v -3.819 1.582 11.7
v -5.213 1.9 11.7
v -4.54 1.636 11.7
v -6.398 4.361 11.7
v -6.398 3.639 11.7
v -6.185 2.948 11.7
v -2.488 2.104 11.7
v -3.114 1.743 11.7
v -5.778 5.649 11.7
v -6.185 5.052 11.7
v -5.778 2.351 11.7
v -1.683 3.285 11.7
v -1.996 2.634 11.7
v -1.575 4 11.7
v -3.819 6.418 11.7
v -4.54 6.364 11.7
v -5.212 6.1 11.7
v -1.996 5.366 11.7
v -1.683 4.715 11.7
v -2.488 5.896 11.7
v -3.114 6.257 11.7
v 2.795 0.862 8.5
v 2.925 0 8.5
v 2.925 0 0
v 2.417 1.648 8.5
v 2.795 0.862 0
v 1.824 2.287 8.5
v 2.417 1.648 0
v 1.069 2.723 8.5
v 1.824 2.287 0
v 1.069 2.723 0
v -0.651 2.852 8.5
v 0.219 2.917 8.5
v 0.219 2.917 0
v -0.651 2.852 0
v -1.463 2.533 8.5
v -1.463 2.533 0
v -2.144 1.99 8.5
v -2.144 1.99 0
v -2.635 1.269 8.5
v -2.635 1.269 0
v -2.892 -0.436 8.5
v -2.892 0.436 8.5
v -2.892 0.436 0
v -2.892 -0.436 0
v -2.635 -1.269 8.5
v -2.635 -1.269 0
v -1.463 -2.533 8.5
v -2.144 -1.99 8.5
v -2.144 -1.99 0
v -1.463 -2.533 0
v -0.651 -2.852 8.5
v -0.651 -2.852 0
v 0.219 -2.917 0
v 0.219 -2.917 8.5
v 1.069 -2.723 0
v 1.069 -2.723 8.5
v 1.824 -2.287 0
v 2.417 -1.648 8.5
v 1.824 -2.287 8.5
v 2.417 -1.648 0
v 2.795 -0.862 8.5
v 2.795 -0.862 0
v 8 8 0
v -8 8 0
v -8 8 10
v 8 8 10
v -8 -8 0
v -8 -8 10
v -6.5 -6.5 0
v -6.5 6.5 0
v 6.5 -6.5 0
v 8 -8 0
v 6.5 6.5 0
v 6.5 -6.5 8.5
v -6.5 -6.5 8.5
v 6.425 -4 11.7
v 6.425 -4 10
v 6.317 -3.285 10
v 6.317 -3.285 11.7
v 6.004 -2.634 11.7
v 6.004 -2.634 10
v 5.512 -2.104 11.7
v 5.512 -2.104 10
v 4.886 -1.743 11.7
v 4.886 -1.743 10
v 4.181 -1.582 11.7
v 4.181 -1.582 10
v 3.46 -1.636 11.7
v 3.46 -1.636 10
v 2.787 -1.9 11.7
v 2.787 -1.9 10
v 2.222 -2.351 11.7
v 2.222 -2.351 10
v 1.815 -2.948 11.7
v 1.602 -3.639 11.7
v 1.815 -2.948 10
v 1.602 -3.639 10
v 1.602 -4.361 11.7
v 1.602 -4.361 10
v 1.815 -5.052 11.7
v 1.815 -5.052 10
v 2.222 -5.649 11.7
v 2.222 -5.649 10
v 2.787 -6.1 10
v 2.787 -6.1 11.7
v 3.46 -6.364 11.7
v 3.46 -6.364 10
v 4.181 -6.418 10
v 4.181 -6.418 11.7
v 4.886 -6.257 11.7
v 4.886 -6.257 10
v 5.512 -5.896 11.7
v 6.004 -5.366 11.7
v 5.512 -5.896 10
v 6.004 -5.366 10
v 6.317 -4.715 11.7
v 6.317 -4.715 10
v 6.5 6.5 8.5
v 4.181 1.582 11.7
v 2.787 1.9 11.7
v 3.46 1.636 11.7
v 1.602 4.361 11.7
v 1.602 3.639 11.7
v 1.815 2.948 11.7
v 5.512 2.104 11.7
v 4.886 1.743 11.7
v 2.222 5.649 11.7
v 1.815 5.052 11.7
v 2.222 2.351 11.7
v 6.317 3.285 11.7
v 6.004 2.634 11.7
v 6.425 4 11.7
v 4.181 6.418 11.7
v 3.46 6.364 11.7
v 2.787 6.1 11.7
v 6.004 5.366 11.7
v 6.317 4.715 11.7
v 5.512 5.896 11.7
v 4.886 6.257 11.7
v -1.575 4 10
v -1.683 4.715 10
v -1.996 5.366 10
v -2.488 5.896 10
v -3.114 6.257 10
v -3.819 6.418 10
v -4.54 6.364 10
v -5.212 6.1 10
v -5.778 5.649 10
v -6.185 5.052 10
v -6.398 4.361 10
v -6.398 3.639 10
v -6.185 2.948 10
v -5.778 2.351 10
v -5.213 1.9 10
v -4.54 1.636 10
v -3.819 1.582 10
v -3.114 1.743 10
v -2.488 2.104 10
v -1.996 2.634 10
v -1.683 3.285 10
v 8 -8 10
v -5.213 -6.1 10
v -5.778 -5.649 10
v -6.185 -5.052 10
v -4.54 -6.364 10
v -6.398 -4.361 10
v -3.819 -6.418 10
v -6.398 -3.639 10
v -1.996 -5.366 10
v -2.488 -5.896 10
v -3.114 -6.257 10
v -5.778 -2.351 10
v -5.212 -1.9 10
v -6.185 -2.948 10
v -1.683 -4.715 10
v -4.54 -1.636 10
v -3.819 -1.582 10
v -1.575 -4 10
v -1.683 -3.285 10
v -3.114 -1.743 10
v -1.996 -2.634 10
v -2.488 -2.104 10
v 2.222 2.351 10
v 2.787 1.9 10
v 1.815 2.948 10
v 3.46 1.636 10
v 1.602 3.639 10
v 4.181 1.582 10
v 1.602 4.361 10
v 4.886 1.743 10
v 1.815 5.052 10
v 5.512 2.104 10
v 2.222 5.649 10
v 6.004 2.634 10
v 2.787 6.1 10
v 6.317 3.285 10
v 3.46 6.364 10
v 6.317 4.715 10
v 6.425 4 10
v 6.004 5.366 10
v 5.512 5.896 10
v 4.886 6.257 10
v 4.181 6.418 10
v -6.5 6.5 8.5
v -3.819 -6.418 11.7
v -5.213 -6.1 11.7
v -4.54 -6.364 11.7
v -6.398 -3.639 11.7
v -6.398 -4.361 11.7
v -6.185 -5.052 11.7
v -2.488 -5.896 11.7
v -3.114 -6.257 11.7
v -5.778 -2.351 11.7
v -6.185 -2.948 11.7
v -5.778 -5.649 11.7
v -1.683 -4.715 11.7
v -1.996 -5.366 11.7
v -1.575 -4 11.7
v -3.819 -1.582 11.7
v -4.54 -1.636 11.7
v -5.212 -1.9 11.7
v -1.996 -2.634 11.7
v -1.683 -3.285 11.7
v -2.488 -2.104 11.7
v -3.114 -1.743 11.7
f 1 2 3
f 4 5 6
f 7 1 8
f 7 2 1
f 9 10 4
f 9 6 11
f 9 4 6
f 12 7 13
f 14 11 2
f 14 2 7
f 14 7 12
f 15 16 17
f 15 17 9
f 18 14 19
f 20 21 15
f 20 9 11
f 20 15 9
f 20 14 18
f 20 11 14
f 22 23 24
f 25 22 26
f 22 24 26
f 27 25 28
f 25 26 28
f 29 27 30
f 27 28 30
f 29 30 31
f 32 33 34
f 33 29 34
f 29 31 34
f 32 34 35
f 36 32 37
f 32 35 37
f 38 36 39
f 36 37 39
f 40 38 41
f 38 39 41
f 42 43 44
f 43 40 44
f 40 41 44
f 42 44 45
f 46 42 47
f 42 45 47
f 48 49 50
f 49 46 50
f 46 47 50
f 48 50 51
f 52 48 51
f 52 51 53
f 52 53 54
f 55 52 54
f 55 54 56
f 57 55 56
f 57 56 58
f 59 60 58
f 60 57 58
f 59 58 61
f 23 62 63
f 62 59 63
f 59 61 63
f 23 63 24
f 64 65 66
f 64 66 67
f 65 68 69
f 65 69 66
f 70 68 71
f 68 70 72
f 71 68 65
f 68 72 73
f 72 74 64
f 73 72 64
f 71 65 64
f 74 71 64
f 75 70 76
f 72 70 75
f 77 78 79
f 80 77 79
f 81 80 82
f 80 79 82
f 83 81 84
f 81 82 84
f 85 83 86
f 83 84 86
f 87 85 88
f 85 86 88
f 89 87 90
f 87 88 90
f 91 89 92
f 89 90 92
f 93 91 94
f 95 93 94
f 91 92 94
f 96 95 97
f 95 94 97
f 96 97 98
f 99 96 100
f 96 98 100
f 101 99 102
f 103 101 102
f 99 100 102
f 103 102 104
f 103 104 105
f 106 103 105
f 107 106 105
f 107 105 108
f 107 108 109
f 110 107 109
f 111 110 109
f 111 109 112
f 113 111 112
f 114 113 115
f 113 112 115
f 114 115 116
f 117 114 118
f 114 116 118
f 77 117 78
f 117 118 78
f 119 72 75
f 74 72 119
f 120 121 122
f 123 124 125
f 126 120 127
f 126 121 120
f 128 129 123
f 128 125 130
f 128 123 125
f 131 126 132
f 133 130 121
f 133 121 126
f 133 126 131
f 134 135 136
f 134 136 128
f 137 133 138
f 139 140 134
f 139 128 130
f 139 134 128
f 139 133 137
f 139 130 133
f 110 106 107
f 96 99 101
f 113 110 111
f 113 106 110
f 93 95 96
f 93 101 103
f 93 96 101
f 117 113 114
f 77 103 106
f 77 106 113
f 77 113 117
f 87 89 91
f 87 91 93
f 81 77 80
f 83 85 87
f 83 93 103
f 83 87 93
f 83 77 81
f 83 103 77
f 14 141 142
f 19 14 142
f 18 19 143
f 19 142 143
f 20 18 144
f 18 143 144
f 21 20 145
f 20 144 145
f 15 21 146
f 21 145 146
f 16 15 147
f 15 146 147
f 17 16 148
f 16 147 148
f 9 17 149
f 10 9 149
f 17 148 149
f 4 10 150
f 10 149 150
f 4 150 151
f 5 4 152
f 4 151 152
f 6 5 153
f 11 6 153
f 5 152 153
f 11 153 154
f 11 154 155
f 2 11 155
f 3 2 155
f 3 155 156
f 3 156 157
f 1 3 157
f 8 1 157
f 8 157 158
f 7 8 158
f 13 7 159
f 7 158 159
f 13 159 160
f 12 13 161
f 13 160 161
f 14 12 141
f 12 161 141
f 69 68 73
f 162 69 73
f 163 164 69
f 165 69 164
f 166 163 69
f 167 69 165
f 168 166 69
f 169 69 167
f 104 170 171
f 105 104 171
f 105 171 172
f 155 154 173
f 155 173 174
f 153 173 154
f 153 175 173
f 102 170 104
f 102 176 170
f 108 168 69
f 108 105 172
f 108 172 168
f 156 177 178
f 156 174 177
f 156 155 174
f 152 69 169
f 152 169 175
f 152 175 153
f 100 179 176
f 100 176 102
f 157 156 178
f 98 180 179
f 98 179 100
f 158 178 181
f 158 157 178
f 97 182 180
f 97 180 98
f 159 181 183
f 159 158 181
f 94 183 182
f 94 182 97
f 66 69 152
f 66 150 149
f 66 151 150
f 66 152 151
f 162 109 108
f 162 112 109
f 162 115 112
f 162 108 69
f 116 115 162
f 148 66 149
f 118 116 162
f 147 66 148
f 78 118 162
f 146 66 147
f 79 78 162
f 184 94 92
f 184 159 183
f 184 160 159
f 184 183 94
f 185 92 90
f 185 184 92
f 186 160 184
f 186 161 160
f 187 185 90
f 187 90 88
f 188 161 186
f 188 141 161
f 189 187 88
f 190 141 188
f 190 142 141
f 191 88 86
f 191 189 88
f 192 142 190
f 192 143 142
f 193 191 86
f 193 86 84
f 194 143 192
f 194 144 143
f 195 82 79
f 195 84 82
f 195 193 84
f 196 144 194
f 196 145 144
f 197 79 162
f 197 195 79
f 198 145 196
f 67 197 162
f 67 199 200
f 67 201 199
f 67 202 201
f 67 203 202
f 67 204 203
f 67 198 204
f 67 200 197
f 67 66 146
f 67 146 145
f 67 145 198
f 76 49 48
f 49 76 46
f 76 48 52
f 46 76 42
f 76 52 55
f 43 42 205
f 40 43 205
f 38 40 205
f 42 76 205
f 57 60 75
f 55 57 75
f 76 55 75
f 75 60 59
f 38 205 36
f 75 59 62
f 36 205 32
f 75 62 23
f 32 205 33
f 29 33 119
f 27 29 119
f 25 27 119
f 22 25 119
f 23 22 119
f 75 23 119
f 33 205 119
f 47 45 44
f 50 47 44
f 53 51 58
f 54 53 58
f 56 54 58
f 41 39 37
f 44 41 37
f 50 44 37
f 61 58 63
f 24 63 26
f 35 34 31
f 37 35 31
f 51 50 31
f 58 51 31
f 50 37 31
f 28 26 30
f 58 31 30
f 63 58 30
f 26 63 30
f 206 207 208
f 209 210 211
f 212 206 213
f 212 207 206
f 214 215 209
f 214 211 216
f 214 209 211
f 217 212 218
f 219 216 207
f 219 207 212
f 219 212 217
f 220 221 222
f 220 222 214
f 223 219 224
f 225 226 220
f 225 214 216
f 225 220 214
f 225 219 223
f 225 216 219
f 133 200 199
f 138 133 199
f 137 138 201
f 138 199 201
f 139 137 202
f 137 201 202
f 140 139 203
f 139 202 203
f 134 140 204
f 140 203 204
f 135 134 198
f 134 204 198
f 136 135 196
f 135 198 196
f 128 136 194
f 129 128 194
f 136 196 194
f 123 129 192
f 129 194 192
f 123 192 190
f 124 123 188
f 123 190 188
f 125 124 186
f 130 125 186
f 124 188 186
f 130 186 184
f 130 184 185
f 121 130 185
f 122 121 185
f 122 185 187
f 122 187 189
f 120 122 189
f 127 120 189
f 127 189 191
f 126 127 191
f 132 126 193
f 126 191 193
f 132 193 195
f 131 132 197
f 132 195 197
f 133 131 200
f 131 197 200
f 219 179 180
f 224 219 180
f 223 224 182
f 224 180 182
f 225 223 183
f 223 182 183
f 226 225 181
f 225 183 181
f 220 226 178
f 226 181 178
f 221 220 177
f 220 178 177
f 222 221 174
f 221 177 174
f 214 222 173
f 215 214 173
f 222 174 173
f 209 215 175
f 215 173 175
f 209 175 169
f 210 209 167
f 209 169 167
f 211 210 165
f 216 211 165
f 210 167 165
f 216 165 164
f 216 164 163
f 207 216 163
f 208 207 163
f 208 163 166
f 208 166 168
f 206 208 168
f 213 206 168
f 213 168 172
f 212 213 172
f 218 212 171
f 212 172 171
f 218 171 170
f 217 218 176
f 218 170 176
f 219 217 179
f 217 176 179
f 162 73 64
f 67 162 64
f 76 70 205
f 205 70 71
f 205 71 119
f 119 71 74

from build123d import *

# Parameters (mm, degrees)
F0_W     = 16
F0_H     = 16
F1_DEPTH = 10
F2_T     = -1.5
F3_R     = 2.425
F4_DEPTH = 1.7
F5_R     = 2.925
F6_DEPTH = 10


with BuildPart() as f1:
    # F0 (on Top) → F1 (new body)
    with BuildSketch(Plane.XY):
        Rectangle(F0_W, F0_H)
    extrude(amount=F1_DEPTH)

    # F2
    f2_openings = [f1.faces().sort_by_distance(p)[0] for p in [
        (0, 0, 0),
    ]]
    offset(amount=F2_T, openings=f2_openings)

    # F3 (on face) → F4 (join)
    with BuildSketch(Plane.XY.offset(10)):
        with Locations((-4, -4)):
            Circle(F3_R)
        with Locations((-4, 4)):
            Circle(F3_R)
        with Locations((4, -4)):
            Circle(F3_R)
        with Locations((4, 4)):
            Circle(F3_R)
    extrude(amount=F4_DEPTH)

    # F5 (on Top) → F6 (join)
    with BuildSketch(Plane.XY):
        Circle(F5_R)
    extrude(amount=F6_DEPTH)


solid = f1.part
